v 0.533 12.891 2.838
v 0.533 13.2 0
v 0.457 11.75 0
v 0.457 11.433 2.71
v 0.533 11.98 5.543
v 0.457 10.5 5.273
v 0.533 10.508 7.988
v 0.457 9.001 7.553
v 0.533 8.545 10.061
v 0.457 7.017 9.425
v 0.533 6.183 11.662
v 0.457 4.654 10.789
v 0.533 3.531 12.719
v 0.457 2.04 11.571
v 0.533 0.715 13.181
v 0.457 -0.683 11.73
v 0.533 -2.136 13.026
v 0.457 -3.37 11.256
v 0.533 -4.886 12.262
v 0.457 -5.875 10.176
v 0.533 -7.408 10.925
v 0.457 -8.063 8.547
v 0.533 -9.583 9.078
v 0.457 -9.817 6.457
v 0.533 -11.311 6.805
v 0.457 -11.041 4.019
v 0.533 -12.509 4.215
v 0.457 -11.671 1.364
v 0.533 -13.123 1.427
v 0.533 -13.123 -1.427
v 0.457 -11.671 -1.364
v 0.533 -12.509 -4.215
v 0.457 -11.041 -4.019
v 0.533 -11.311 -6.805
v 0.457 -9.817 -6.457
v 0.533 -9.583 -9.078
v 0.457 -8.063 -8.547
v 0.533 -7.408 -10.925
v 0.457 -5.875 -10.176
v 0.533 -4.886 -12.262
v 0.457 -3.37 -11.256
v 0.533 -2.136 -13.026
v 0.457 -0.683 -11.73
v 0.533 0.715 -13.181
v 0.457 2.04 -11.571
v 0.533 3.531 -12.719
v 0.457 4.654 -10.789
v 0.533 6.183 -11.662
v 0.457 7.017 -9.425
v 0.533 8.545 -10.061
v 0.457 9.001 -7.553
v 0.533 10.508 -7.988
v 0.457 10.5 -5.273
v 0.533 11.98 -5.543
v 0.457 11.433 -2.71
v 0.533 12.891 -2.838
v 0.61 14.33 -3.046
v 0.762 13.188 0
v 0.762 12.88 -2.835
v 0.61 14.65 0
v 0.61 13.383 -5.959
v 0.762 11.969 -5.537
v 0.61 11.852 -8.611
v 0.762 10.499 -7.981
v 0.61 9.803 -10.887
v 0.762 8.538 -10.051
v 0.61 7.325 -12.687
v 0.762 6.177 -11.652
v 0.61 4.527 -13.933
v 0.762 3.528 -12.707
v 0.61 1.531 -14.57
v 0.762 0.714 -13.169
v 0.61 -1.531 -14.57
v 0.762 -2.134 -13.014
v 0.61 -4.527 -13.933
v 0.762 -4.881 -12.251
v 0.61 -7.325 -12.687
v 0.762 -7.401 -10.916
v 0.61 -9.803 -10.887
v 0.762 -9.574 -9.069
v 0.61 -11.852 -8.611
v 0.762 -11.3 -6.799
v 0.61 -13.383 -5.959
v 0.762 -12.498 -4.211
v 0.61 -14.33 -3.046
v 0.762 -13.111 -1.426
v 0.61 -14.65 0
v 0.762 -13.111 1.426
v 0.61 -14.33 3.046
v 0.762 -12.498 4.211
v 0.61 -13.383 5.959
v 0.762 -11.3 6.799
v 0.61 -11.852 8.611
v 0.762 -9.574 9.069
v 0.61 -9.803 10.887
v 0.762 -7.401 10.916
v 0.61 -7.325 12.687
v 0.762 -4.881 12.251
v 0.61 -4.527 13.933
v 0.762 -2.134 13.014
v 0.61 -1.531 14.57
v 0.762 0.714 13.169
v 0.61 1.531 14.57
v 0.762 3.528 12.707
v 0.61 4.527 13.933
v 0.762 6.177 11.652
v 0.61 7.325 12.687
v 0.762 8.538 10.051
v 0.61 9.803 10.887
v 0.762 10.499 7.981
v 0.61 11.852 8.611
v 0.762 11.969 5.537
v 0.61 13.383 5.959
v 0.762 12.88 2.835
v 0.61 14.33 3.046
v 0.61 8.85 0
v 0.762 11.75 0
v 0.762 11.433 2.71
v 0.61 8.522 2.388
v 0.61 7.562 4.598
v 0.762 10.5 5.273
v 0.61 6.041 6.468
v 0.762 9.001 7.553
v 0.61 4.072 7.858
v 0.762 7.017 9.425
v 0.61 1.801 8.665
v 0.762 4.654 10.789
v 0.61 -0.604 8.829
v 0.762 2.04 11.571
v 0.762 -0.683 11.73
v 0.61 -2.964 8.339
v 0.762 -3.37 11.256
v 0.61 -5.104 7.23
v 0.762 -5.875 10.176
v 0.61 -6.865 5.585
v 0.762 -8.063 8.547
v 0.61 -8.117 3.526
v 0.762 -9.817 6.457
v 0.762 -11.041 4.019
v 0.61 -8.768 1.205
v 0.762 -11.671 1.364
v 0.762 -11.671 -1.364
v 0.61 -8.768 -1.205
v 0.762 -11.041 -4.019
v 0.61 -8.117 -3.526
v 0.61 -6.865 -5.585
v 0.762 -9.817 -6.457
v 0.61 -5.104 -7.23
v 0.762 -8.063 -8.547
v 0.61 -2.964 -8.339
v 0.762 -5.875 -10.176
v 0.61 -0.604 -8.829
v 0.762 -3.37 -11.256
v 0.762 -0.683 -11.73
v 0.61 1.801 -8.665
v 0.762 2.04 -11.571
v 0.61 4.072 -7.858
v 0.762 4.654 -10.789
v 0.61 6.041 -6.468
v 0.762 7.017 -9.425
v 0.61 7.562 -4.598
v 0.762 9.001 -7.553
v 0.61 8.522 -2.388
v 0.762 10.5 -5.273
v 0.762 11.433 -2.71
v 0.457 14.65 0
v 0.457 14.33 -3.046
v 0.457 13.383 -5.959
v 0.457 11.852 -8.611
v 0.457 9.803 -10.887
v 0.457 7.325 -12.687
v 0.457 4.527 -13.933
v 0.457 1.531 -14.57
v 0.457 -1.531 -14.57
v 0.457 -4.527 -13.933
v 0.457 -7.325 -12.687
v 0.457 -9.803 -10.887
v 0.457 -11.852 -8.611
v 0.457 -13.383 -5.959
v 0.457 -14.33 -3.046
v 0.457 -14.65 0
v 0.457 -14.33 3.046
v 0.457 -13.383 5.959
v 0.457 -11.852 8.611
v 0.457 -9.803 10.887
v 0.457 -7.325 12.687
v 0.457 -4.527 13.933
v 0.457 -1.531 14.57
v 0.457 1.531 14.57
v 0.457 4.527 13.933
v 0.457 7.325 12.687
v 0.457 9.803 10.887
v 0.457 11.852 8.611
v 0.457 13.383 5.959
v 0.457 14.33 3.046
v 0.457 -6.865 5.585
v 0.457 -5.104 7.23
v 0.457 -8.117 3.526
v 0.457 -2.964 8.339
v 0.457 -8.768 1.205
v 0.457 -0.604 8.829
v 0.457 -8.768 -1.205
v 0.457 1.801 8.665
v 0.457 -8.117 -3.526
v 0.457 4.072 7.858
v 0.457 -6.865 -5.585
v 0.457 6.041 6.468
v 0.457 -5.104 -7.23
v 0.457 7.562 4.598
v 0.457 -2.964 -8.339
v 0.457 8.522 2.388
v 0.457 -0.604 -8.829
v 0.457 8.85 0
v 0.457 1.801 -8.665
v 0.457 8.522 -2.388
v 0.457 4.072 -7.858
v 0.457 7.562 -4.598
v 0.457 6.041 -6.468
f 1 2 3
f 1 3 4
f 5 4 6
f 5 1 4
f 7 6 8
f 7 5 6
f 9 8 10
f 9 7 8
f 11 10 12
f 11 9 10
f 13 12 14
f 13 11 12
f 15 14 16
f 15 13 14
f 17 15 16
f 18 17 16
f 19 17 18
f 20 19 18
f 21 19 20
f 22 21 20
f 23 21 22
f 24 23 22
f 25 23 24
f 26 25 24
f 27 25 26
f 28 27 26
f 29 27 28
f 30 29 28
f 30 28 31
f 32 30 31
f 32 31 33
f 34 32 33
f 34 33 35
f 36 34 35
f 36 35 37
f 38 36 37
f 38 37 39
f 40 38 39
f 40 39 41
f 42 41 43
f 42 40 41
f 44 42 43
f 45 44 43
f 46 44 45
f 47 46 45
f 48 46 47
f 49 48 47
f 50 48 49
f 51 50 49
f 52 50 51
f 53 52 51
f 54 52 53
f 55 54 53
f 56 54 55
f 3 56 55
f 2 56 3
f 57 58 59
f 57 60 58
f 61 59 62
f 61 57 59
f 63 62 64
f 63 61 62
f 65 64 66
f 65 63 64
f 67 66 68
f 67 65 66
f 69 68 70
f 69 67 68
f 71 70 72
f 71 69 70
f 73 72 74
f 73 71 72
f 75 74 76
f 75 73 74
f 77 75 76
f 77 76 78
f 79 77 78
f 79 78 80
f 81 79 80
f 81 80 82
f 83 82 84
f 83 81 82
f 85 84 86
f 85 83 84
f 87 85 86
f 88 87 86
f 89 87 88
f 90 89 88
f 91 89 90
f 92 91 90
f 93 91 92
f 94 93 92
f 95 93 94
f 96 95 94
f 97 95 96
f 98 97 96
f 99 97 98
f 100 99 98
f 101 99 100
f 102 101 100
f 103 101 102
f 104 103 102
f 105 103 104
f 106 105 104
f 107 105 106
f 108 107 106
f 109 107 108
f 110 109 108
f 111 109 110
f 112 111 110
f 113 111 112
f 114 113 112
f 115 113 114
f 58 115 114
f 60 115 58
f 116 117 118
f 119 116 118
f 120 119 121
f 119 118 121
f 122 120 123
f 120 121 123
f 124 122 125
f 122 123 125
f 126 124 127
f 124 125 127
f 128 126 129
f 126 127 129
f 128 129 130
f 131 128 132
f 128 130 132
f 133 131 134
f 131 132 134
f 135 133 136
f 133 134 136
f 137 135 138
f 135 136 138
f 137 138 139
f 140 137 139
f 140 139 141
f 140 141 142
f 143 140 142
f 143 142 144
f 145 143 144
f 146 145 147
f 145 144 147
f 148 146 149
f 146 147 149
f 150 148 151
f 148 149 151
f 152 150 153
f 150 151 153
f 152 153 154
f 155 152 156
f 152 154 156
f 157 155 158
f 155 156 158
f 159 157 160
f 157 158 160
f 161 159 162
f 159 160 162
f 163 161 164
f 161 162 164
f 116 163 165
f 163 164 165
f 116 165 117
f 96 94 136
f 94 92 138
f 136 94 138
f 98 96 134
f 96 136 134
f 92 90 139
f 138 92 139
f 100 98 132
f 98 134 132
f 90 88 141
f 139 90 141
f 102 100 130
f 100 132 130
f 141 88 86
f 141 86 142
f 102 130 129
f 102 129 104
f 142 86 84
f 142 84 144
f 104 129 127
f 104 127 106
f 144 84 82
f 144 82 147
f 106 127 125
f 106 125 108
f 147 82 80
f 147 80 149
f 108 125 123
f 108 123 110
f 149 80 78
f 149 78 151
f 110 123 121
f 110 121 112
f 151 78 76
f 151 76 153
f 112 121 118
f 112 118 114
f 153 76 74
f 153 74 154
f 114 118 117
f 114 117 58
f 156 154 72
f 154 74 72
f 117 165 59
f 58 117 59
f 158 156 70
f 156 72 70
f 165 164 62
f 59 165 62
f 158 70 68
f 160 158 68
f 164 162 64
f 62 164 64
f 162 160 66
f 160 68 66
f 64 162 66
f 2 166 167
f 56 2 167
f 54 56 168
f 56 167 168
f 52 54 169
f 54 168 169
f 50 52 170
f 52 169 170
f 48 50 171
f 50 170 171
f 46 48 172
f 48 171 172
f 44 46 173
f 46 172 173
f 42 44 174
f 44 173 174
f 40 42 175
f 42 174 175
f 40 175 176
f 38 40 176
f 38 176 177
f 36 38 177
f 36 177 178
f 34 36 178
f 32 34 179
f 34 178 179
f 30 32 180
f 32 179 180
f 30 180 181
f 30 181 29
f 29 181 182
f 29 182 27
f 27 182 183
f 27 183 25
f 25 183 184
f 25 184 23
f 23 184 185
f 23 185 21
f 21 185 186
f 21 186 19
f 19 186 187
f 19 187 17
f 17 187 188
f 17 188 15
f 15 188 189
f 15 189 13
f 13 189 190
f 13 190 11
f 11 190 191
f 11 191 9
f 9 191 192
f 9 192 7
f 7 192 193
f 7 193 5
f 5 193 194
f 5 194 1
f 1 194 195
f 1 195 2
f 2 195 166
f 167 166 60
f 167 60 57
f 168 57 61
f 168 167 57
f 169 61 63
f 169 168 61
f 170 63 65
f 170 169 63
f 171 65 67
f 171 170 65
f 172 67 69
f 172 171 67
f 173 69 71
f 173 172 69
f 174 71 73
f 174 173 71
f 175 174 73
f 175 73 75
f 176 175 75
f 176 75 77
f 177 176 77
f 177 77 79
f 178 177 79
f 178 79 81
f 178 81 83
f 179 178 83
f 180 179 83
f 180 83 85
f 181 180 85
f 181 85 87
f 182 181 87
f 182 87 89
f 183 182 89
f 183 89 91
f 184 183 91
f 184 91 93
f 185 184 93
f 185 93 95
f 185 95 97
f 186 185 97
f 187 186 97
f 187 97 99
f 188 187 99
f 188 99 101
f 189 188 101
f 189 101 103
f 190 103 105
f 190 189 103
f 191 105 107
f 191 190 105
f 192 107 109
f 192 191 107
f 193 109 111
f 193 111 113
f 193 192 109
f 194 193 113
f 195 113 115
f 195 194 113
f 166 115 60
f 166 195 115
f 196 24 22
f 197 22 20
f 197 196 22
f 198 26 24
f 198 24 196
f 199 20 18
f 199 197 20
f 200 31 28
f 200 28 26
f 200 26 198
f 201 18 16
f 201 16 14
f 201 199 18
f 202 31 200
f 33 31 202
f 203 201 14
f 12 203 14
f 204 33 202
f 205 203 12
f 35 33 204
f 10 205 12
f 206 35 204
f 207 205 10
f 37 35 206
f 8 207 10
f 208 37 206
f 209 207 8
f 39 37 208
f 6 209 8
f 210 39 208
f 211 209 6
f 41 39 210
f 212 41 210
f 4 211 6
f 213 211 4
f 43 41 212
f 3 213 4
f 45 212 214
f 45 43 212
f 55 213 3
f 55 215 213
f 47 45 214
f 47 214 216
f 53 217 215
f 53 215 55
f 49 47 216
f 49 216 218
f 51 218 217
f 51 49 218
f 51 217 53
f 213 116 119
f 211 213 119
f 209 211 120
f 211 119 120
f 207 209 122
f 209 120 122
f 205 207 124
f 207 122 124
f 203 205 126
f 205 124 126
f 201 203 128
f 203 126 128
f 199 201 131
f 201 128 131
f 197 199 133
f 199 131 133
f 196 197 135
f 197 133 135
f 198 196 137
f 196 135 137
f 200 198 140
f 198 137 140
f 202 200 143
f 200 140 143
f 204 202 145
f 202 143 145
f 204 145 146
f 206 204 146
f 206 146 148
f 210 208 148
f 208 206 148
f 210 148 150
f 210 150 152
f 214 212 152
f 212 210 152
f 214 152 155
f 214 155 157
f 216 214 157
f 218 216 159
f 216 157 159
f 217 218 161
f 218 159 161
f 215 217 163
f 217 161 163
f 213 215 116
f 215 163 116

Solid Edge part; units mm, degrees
sketch "Sketch1" plane through (0, 0, 0) normal (0, 0, 1) x (1, 0, 0)
  line L0 (0.457, 8.85) -> (0.6095, 8.85)
  line L1 (0.6095, 8.85) -> (0.762, 11.75)
  line L2 (0.762, 11.75) -> (0.762, 13.188)
  line L3 (0.762, 13.188) -> (0.6095, 14.65)
  line L4 (0.6095, 14.65) -> (0.457, 14.65)
  line L5 (0.457, 14.65) -> (0.5333, 13.2)
  line L6 (0.5333, 13.2) -> (0.457, 11.75)
  line L7 (0.457, 11.75) -> (0.457, 8.85)
revolve "RevolvedProtrusion1" add sketch "Sketch1" angle 360 about axis through (0.6095, 0, 0) along (-1, 0, 0)
properties material "Steel"
